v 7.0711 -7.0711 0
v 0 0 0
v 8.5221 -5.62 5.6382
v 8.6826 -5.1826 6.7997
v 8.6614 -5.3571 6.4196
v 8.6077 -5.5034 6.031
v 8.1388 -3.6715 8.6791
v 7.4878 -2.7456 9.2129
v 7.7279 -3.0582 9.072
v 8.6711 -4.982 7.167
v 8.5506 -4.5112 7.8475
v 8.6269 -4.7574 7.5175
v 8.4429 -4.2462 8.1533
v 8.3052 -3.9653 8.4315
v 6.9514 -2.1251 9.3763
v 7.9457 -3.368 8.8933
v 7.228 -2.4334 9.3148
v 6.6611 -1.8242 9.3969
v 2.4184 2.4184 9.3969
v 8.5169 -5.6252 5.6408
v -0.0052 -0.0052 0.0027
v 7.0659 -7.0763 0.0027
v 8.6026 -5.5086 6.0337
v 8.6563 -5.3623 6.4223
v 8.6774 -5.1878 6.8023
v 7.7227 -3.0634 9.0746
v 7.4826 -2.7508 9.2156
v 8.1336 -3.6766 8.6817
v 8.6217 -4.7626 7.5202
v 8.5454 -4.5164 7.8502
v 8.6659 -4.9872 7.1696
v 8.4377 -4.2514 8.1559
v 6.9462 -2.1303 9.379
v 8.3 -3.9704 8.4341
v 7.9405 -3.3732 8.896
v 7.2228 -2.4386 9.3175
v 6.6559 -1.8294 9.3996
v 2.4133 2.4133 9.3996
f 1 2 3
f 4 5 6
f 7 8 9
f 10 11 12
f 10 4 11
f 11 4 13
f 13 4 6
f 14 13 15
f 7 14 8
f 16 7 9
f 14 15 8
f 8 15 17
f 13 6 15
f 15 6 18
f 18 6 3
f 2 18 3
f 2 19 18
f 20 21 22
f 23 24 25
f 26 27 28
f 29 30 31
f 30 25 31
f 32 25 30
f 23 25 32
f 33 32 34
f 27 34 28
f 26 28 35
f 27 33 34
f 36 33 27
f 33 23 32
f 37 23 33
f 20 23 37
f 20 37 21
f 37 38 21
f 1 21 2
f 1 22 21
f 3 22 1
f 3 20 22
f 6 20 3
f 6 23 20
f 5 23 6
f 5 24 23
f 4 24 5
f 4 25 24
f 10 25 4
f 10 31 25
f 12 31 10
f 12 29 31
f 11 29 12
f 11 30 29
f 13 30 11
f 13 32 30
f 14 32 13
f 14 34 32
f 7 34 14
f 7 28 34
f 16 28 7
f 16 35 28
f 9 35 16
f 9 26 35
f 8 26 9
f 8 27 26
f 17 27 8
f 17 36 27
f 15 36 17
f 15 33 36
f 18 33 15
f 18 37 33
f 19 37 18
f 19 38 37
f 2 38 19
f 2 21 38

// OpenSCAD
// file: ../utils/core/clip.scad
//
// NopSCADlib Copyright Chris Palmer 2018
// nop.head@gmail.com
// hydraraptor.blogspot.com
//
// This file is part of NopSCADlib.
//
// NopSCADlib is free software: you can redistribute it and/or modify it under the terms of the
// GNU General Public License as published by the Free Software Foundation, either version 3 of
// the License, or (at your option) any later version.
//
// NopSCADlib is distributed in the hope that it will be useful, but WITHOUT ANY WARRANTY;
// without even the implied warranty of MERCHANTABILITY or FITNESS FOR A PARTICULAR PURPOSE.
// See the GNU General Public License for more details.
//
// You should have received a copy of the GNU General Public License along with NopSCADlib.
// If not, see <https://www.gnu.org/licenses/>.
//

//
//! Construct arbirarily large box to partition 3D space and clip objects, useful for creating cross sections to see the inside when debugging.
//!
//! Original version by Doug Moen on the OpenSCAD forum
//
//
module box(xmin, ymin, zmin, xmax, ymax, zmax) //! Construct a box given its bounds
    polyhedron(
        [[xmin, ymin, zmin],  // 0
         [xmin, ymin, zmax],  // 1
         [xmin, ymax, zmin],  // 2
         [xmin, ymax, zmax],  // 3
         [xmax, ymin, zmin],  // 4
         [xmax, ymin, zmax],  // 5
         [xmax, ymax, zmin],  // 6
         [xmax, ymax, zmax]], // 7
        [[7,5,1,3],  // top
         [2,0,4,6],  // bottom
         [5,4,0,1],  // front
         [3,2,6,7],  // back
         [5,7,6,4],  // right
         [0,2,3,1]]  // left
    );

module clip(xmin = -inf, ymin = -inf, zmin = -inf, xmax = inf, ymax = inf, zmax = inf) //! Clip child to specified boundaries
    render() intersection() {
        children();

        box(xmin, ymin, zmin, xmax, ymax, zmax);
    }
// file: ../utils/core/rounded_rectangle.scad
//
// NopSCADlib Copyright Chris Palmer 2018
// nop.head@gmail.com
// hydraraptor.blogspot.com
//
// This file is part of NopSCADlib.
//
// NopSCADlib is free software: you can redistribute it and/or modify it under the terms of the
// GNU General Public License as published by the Free Software Foundation, either version 3 of
// the License, or (at your option) any later version.
//
// NopSCADlib is distributed in the hope that it will be useful, but WITHOUT ANY WARRANTY;
// without even the implied warranty of MERCHANTABILITY or FITNESS FOR A PARTICULAR PURPOSE.
// See the GNU General Public License for more details.
//
// You should have received a copy of the GNU General Public License along with NopSCADlib.
// If not, see <https://www.gnu.org/licenses/>.
//

//
//! Rectangle with rounded corners.
//
module rounded_square(size, r, center = true) //! Like ```square()``` but with with rounded corners
{
    $fn = r2sides4n(r);
    offset(r) offset(-r) square(size, center = center);
}

module rounded_rectangle(size, r, center = true, xy_center = true) //! Like ```cube()``` but corners rounded in XY plane and separate centre options for xy and z.
{
    linear_extrude(height = size[2], center = center)
        rounded_square([size[0], size[1]], r, xy_center);
}
// file: ../utils/core/teardrops.scad
//
// NopSCADlib Copyright Chris Palmer 2018
// nop.head@gmail.com
// hydraraptor.blogspot.com
//
// This file is part of NopSCADlib.
//
// NopSCADlib is free software: you can redistribute it and/or modify it under the terms of the
// GNU General Public License as published by the Free Software Foundation, either version 3 of
// the License, or (at your option) any later version.
//
// NopSCADlib is distributed in the hope that it will be useful, but WITHOUT ANY WARRANTY;
// without even the implied warranty of MERCHANTABILITY or FITNESS FOR A PARTICULAR PURPOSE.
// See the GNU General Public License for more details.
//
// You should have received a copy of the GNU General Public License along with NopSCADlib.
// If not, see <https://www.gnu.org/licenses/>.
//

//
//! For making horizontal holes that don't need support material.
//! Small holes can get away without it, but they print better with truncated teardrops.
//
module teardrop(h, r, center = true, truncate = true) //! For making horizontal holes that don't need support material, set ```truncate = false``` to make traditional RepRap teardrops that don't even need bridging
    render(convexity = 5)
        extrude_if(h, center)
           hull() {
                circle4n(r);

                if(truncate)
                    translate([0, r / 2])
                        square([2 * r * (sqrt(2) - 1), r], center = true);
                else
                    polygon([[0, 0], [eps, 0], [0, r * sqrt(2)]]);
            }

module teardrop_plus(h, r, center = true, truncate = true) //! Slightly bigger teardrop to allow for the 3D printing staircase effect
    teardrop(h, r + layer_height / 4, center, truncate);

module tearslot(h, r, w, center = true) //! A horizontal slot that doesn't need support material
    extrude_if(h, center)
        hull() {
            translate([-w/2,0,0]) teardrop(r = r, h = 0);
            translate([ w/2,0,0]) teardrop(r = r, h = 0);
        }

module vertical_tearslot(h, r, l, center = true) //! A vertical slot that doesn't need support material
    extrude_if(h, center)
        hull() {
            translate([0,  l / 2]) teardrop(0, r, true);
            translate([0, -l / 2])
                circle4n(r);
        }
// file: ../utils/core/polyholes.scad
//
// NopSCADlib Copyright Chris Palmer 2018
// nop.head@gmail.com
// hydraraptor.blogspot.com
//
// This file is part of NopSCADlib.
//
// NopSCADlib is free software: you can redistribute it and/or modify it under the terms of the
// GNU General Public License as published by the Free Software Foundation, either version 3 of
// the License, or (at your option) any later version.
//
// NopSCADlib is distributed in the hope that it will be useful, but WITHOUT ANY WARRANTY;
// without even the implied warranty of MERCHANTABILITY or FITNESS FOR A PARTICULAR PURPOSE.
// See the GNU General Public License for more details.
//
// You should have received a copy of the GNU General Public License along with NopSCADlib.
// If not, see <https://www.gnu.org/licenses/>.
//

//
//! A method of making 3D printed holes come out the right size regardless of the printer, providing
//! it gets the linear dimensions right. See <https://hydraraptor.blogspot.com/2011/02/polyholes.html>
//!
//! The module provides `poly_circle()`, `poly_cylinder()` and `poly_ring()` that is useful for making printed washers and pillars.
//
function sides(r) = max(round(4 * r), 3); //! Optimium number of sides for specified radius
function corrected_radius(r, n = 0)   = r / cos(180 / (n ? n : sides(r))); //! Adjusted radius to make flats lie on the circle
function corrected_diameter(d, n = 0) = d / cos(180 / (n ? n : sides(d / 2))); //! Adjusted diameter to make flats lie on the circle

module poly_circle(r, sides = 0) { //! Make a circle adjusted to print the correct size
    n = sides ? sides : sides(r);
    circle(r = corrected_radius(r,n), $fn = n);
}

module poly_cylinder(r, h, center = false, sides = 0) //! Make a cylinder adjusted to print the correct size
    extrude_if(h, center)
        poly_circle(r, sides);

module poly_ring(or, ir) { //! Make a 2D ring adjusted to have the correct internal radius
    cir = corrected_radius(ir);
    filaments = floor((or - cir) / extrusion_width);
    if(filaments > 3)
        difference() {
            circle(or);

            poly_circle(ir);
        }
    else
        if(filaments >= 2)
            difference() {
                offset(or - cir)
                    poly_circle(ir);

                poly_circle(ir);
            }
            else
                difference() {
                    poly_circle(or);

                    offset(-squeezed_wall)
                        poly_circle(or);
                }
}

module drill(r, h = 100) //! Make a cylinder for drilling holes suitable for CNC routing, set h = 0 for circle
    extrude_if(h)
        circle(r = corrected_radius(r, r2sides(r)));
//
// Horizontal slot
//
module slot(r, l, h = 100) //! Make a horizontal slot suitable for CNC routing, set h = 0 for 2D version
    extrude_if(h)
        hull() {
            translate([l / 2,0])
                drill(r, 0);

            translate([-l / 2,0])
                drill(r, 0);
        }
// file: ../utils/core/bom.scad
//
// NopSCADlib Copyright Chris Palmer 2018
// nop.head@gmail.com
// hydraraptor.blogspot.com
//
// This file is part of NopSCADlib.
//
// NopSCADlib is free software: you can redistribute it and/or modify it under the terms of the
// GNU General Public License as published by the Free Software Foundation, either version 3 of
// the License, or (at your option) any later version.
//
// NopSCADlib is distributed in the hope that it will be useful, but WITHOUT ANY WARRANTY;
// without even the implied warranty of MERCHANTABILITY or FITNESS FOR A PARTICULAR PURPOSE.
// See the GNU General Public License for more details.
//
// You should have received a copy of the GNU General Public License along with NopSCADlib.
// If not, see <https://www.gnu.org/licenses/>.
//

//
//! Bill Of Materials generation via echo and the ```bom.py``` script. Also handles exploded assembly views and posing. Assembly instructions can precede the module
//! definition that makes the assembly.
//!
//! The example below shows how to define a vitamin and incorporate it into an assembly with sub-assemblies and make an exploded view. The resulting flat BOM is shown but
//! heirachical BOMs are also generated for real projects.
//
function bom_mode(n = 1) = $_bom >= n && (is_undef($on_bom) || $on_bom);  //! Current BOM mode, 0 = none, 1 = printed and routed parts and assemblies, 2 includes vitamins as well
function exploded() = is_undef($exploded_parent) ? $exploded : 0;   //! Returns the value of ```$exploded``` if it is defined, else ```0```
function show_supports() = !$preview || exploded();                 //! True if printed support material should be shown

module no_explode() let($exploded_parent = true) children();        //! Prevent children being exploded
module no_pose() let($posed = true) children();                     //! Force children not to be posed even if parent is

module explode(d, explode_children = false, offset = [0,0,0]) {     //! Explode children by specified Z distance or vector ```d```, option to explode grand children
    v = is_list(d) ? d : [0, 0, d];
    o = is_list(offset) ? offset : [0, 0, offset];
    if($exploded && is_undef($exploded_parent)) {
        translate(o)                                                // Draw the line first in case the child is transparent
            hull() {
                sphere(0.2);

                translate(v * $exploded)
                    sphere(0.2);
            }

        translate(v * $exploded)
            let($exploded_parent = explode_children ? undef : true)
                children();
    }
    else
        children();
}

module pose(a = [55, 0, 25], t = [0, 0, 0], exploded = undef)       //! Pose an STL or assembly for rendering to png by specifying rotation ```a``` and translation ```t```, ```exploded = true for``` just the exploded view or ```false``` for unexploded only.
    if(is_undef($pose) || !is_undef($posed) || (!is_undef(exploded) && exploded != !!exploded()))
        children();
    else
        let($posed = true) // only pose the top level
            rotate([55, 0, 25])
                rotate([-a.x, 0, 0])
                    rotate([0, -a.y, 0])
                        rotate([0, 0, -a.z])
                            translate(-t)
                                children();


module assembly(name) {                 //! Name an assembly that will appear on the BOM, there needs to a module named ```<name>_assembly``` to make it
    if(bom_mode())
        echo(str("~", name, "_assembly{"));

    no_pose()
        if(is_undef($child_assembly))
            let($child_assembly = true)
                children();
        else
            no_explode()
                children();

    if(bom_mode())
        echo(str("~}", name, "_assembly"));
}

module stl(name) {                      //! Name an stl that will appear on the BOM, there needs to a module named ```<name>_stl``` to make it
    if(bom_mode())
        echo(str("~", name, ".stl"));
}

module dxf(name) {                      //! Name a dxf that will appear on the BOM, there needs to a module named ```<name>_dxf``` to make it
    if(bom_mode())
        echo(str("~", name, ".dxf"));
}

function value_string(value) = is_string(value) ? str("\"", value, "\"") : str(value); //! Convert ```value``` to a string or quote it if it is already a string

function arg(value, default, name = "") =   //! Create string for arg if not default, helper for ```vitamin()```
    value == default ? ""
                     : name ? str(", ", name, " = ", value_string(value))
                            : str(", ", value_string(value));

module vitamin(description) {                //! Describe a vitamin for the BOM entry and precede it with a module call that creates it, eg. "wigit(42): Type 42 widget"
    if(bom_mode(2))
        echo(str("~", description, !is_undef($hidden) ? " - not shown" : ""));
}

module not_on_bom(on = false)               //! Specify the following child parts are not on the BOM, for example when they are on a PCB that comes assembled
    let($on_bom = on)
        children();

module hidden()                             //! Make item invisible, except on the BOM
    scale(1 / sqr(1024))
        let($hidden = true)
            children();
// file: ../utils/core/sphere.scad
//
// NopSCADlib Copyright Chris Palmer 2018
// nop.head@gmail.com
// hydraraptor.blogspot.com
//
// This file is part of NopSCADlib.
//
// NopSCADlib is free software: you can redistribute it and/or modify it under the terms of the
// GNU General Public License as published by the Free Software Foundation, either version 3 of
// the License, or (at your option) any later version.
//
// NopSCADlib is distributed in the hope that it will be useful, but WITHOUT ANY WARRANTY;
// without even the implied warranty of MERCHANTABILITY or FITNESS FOR A PARTICULAR PURPOSE.
// See the GNU General Public License for more details.
//
// You should have received a copy of the GNU General Public License along with NopSCADlib.
// If not, see <https://www.gnu.org/licenses/>.
//

//! Redefines `sphere()` to always have a vertex on all six half axes I.e. vertices at the poles and the equator and `$fn` a multiple of four.
//! This ensures `hull` and `minkowski` results have the correct dimensions when spheres are placed at the corners.

module sphere(r = 1, d = undef) {                   //! Override ```sphere``` so that has vertices on all three axes. Has the advantage of giving correct dimensions when hulled
    R = is_undef(d) ? r : d / 2;
    rotate_extrude($fn = r2sides4n(R))
        rotate(-90)
            semi_circle(R);
}
// file: ../utils/core/global.scad
//
// NopSCADlib Copyright Chris Palmer 2018
// nop.head@gmail.com
// hydraraptor.blogspot.com
//
// This file is part of NopSCADlib.
//
// NopSCADlib is free software: you can redistribute it and/or modify it under the terms of the
// GNU General Public License as published by the Free Software Foundation, either version 3 of
// the License, or (at your option) any later version.
//
// NopSCADlib is distributed in the hope that it will be useful, but WITHOUT ANY WARRANTY;
// without even the implied warranty of MERCHANTABILITY or FITNESS FOR A PARTICULAR PURPOSE.
// See the GNU General Public License for more details.
//
// You should have received a copy of the GNU General Public License along with NopSCADlib.
// If not, see <https://www.gnu.org/licenses/>.
//

//
//! Global constants, functions and modules. This file is used directly or indirectly in every scad file.
//
include <../../global_defs.scad>

function sqr(x) = x * x;                                                            //! Returns the square of ```x```
function inch(x) = x * 25.4;                                                        //! Inch to mm conversion
function echoit(x) = echo(x) x;                                                     //! Echo expression and return it, useful for debugging
function in(list, x) = !!len([for(v = list) if(v == x) true]);                      //! Returns true if ```x``` is an element in the ```list```
function Len(x) = is_list(x) ? len(x) : 0;                                          //! Returns the length of a list or 0 if ```x``` is not a list
function r2sides(r) = $fn ? $fn : ceil(max(min(360/ $fa, r * 2 * PI / $fs), 5));    //! Replicates the OpenSCAD logic to calculate the number of sides from the radius
function r2sides4n(r) = floor((r2sides(r) + 3) / 4) * 4;                            //! Round up the number of sides to a multiple of 4 to ensure points land on all axes

module translate_z(z) translate([0, 0, z]) children();                              //! Shortcut for Z only translations
module vflip() rotate([180, 0, 0]) children();                                      //! Invert children by doing a 180 flip around the X axis
module ellipse(xr, yr) scale([1, yr / xr]) circle4n(xr);                            //! Draw an ellipse

module extrude_if(h, center = true)                 //! Extrudes 2D object to 3D when ```h``` is nonzero, otherwise leaves it 2D
    if(h)
        linear_extrude(height = h, center = center) // 3D
            children();
    else
        children();                                 // 2D

module circle4n(r, d = undef) {                     //! Circle with multiple of 4 vertices
    R = is_undef(d) ? r : d / 2;
    circle(R, $fn = r2sides4n(R));
}

module semi_circle(r, d = undef)                    //! A semi circle in the positive Y domain
    intersection() {
        R = is_undef(d) ? r : d / 2;
        circle4n(R);

        sq = R + 1;
        translate([-sq, 0])
            square([2 * sq, sq]);
    }

include <sphere.scad>
include <bom.scad>
include <polyholes.scad>
include <teardrops.scad>
include <rounded_rectangle.scad>
include <clip.scad>
// file: ../core.scad
//
// NopSCADlib Copyright Chris Palmer 2018
// nop.head@gmail.com
// hydraraptor.blogspot.com
//
// This file is part of NopSCADlib.
//
// NopSCADlib is free software: you can redistribute it and/or modify it under the terms of the
// GNU General Public License as published by the Free Software Foundation, either version 3 of
// the License, or (at your option) any later version.
//
// NopSCADlib is distributed in the hope that it will be useful, but WITHOUT ANY WARRANTY;
// without even the implied warranty of MERCHANTABILITY or FITNESS FOR A PARTICULAR PURPOSE.
// See the GNU General Public License for more details.
//
// You should have received a copy of the GNU General Public License along with NopSCADlib.
// If not, see <https://www.gnu.org/licenses/>.
//

//
// Include this file to use the library
//
include <global_defs.scad>
//
// Global functions and modules
//
use <utils/core/global.scad>
// file: ../utils/quadrant.scad
//
// NopSCADlib Copyright Chris Palmer 2018
// nop.head@gmail.com
// hydraraptor.blogspot.com
//
// This file is part of NopSCADlib.
//
// NopSCADlib is free software: you can redistribute it and/or modify it under the terms of the
// GNU General Public License as published by the Free Software Foundation, either version 3 of
// the License, or (at your option) any later version.
//
// NopSCADlib is distributed in the hope that it will be useful, but WITHOUT ANY WARRANTY;
// without even the implied warranty of MERCHANTABILITY or FITNESS FOR A PARTICULAR PURPOSE.
// See the GNU General Public License for more details.
//
// You should have received a copy of the GNU General Public License along with NopSCADlib.
// If not, see <https://www.gnu.org/licenses/>.
//

//
//! Square with one rounded corner.
//
include <../core.scad>

module quadrant(w, r, center = false) { //! Draw a square with one rounded corner, can be centered on the arc centre, when ```center``` is ```true```.
    offset = center ? r - w : 0;
    translate([offset, offset])
        hull() {
            intersection() {
                translate([w - r, w - r])
                    circle4n(r);

                square(w);
            }

            square([w, eps]);

            square([eps, w]);
        }
}
// file: ../global_defs.scad
//
// NopSCADlib Copyright Chris Palmer 2018
// nop.head@gmail.com
// hydraraptor.blogspot.com
//
// This file is part of NopSCADlib.
//
// NopSCADlib is free software: you can redistribute it and/or modify it under the terms of the
// GNU General Public License as published by the Free Software Foundation, either version 3 of
// the License, or (at your option) any later version.
//
// NopSCADlib is distributed in the hope that it will be useful, but WITHOUT ANY WARRANTY;
// without even the implied warranty of MERCHANTABILITY or FITNESS FOR A PARTICULAR PURPOSE.
// See the GNU General Public License for more details.
//
// You should have received a copy of the GNU General Public License along with NopSCADlib.
// If not, see <https://www.gnu.org/licenses/>.
//

//
// This file included directly or indirectly in every scad file.
//
// This scheme allows the following:
//  bom defaults to 0
//  Setting $bom on the command line or in the main file before including lib.scad overrides it everywhere.
//  Setting $bom after including lib overrides bom in the libs but not in the local file.
//  Setting $_bom in the local file overrides it in the local file but not in the libs.
//
//function is_undef(x) = x == undef;

$_bom           = is_undef($bom)             ? 0      : $bom;             // 0 no bom, 1 assemblies and stls, 2 vitamins as well
$exploded       = is_undef($explode)         ? 0      : $explode;         // 1 for exploded view
layer_height    = is_undef($layer_height)    ? 0.25   : $layer_height;    // layer heigth when printing
extrusion_width = is_undef($extrusion_width) ? 0.5    : $extrusion_width; // filament width when printing
nozzle          = is_undef($nozzle)          ? 0.45   : $nozzle;          // 3D printer nozzle
cnc_bit_r       = is_undef($cnc_bit_r)       ? 1.2    : $cnc_bit_r;       // miniumum tool radius when milling 2D objects
pp1_colour      = is_undef($pp1_colour)      ? "lime" : $pp1_colour;      // printed part colour 1
pp2_colour      = is_undef($pp2_colour)      ? "red"  : $pp2_colour;      // printed part colour 2
pp3_colour      = is_undef($pp3_colour)      ? "blue" : $pp3_colour;      // printed part colour 3
pp4_colour      = is_undef($pp4_colour)      ? "darkorange" : $pp4_colour;// printed part colour 4
show_rays       = is_undef($show_rays)       ? false  : $show_rays;       // show camera sight lines and light direction

// Minimum wall is about two filaments wide but we extrude it closer to get better bonding
squeezed_wall = $preview ? 2 * extrusion_width - layer_height * (1 - PI / 4)
                         : extrusion_width - layer_height / 2 + nozzle / 2 + extrusion_width / 2;

inf = 1e10;      // very big
eps = 1/128;     // small fudge factor to stop CSG barfing on coincident faces.
$fa = 6;
$fs = extrusion_width / 2;

function round_to_layer(z) = ceil(z / layer_height) * layer_height;
// Some additional named colors
grey20                          = [0.2, 0.2, 0.2];
grey30                          = [0.3, 0.3, 0.3];
grey40                          = [0.4, 0.4, 0.4];
grey50                          = [0.5, 0.5, 0.5];
grey60                          = [0.6, 0.6, 0.6];
grey70                          = [0.7, 0.7, 0.7];
grey80                          = [0.8, 0.8, 0.8];
grey90                          = [0.9, 0.9, 0.9];
brass                           = "gold";

/*
 * Enums
 */
//
// Screws
//
hs_cap    = 0;
hs_pan    = 1;
hs_cs     = 2;     // counter sunk
hs_hex    = 3;
hs_grub   = 4;     // pulley set screw
hs_cs_cap = 5;
hs_dome   = 6;
//
// Hot end descriptions
//
jhead   = 1;
e3d     = 2;
//
// Face enumeration
//
f_bottom = 0;
f_top    = 1;
f_left   = 2;
f_right  = 3;
f_front  = 4;
f_back   = 5;
// main file
//
// NopSCADlib Copyright Chris Palmer 2018
// nop.head@gmail.com
// hydraraptor.blogspot.com
//
// This file is part of NopSCADlib.
//
// NopSCADlib is free software: you can redistribute it and/or modify it under the terms of the
// GNU General Public License as published by the Free Software Foundation, either version 3 of
// the License, or (at your option) any later version.
//
// NopSCADlib is distributed in the hope that it will be useful, but WITHOUT ANY WARRANTY;
// without even the implied warranty of MERCHANTABILITY or FITNESS FOR A PARTICULAR PURPOSE.
// See the GNU General Public License for more details.
//
// You should have received a copy of the GNU General Public License along with NopSCADlib.
// If not, see <https://www.gnu.org/licenses/>.
//

include <../global_defs.scad>
use <../utils/quadrant.scad>


module quadrants() {
    linear_extrude(height = eps)
        quadrant(10, 4);
}

rotate([70, 0, 315]) quadrants();
